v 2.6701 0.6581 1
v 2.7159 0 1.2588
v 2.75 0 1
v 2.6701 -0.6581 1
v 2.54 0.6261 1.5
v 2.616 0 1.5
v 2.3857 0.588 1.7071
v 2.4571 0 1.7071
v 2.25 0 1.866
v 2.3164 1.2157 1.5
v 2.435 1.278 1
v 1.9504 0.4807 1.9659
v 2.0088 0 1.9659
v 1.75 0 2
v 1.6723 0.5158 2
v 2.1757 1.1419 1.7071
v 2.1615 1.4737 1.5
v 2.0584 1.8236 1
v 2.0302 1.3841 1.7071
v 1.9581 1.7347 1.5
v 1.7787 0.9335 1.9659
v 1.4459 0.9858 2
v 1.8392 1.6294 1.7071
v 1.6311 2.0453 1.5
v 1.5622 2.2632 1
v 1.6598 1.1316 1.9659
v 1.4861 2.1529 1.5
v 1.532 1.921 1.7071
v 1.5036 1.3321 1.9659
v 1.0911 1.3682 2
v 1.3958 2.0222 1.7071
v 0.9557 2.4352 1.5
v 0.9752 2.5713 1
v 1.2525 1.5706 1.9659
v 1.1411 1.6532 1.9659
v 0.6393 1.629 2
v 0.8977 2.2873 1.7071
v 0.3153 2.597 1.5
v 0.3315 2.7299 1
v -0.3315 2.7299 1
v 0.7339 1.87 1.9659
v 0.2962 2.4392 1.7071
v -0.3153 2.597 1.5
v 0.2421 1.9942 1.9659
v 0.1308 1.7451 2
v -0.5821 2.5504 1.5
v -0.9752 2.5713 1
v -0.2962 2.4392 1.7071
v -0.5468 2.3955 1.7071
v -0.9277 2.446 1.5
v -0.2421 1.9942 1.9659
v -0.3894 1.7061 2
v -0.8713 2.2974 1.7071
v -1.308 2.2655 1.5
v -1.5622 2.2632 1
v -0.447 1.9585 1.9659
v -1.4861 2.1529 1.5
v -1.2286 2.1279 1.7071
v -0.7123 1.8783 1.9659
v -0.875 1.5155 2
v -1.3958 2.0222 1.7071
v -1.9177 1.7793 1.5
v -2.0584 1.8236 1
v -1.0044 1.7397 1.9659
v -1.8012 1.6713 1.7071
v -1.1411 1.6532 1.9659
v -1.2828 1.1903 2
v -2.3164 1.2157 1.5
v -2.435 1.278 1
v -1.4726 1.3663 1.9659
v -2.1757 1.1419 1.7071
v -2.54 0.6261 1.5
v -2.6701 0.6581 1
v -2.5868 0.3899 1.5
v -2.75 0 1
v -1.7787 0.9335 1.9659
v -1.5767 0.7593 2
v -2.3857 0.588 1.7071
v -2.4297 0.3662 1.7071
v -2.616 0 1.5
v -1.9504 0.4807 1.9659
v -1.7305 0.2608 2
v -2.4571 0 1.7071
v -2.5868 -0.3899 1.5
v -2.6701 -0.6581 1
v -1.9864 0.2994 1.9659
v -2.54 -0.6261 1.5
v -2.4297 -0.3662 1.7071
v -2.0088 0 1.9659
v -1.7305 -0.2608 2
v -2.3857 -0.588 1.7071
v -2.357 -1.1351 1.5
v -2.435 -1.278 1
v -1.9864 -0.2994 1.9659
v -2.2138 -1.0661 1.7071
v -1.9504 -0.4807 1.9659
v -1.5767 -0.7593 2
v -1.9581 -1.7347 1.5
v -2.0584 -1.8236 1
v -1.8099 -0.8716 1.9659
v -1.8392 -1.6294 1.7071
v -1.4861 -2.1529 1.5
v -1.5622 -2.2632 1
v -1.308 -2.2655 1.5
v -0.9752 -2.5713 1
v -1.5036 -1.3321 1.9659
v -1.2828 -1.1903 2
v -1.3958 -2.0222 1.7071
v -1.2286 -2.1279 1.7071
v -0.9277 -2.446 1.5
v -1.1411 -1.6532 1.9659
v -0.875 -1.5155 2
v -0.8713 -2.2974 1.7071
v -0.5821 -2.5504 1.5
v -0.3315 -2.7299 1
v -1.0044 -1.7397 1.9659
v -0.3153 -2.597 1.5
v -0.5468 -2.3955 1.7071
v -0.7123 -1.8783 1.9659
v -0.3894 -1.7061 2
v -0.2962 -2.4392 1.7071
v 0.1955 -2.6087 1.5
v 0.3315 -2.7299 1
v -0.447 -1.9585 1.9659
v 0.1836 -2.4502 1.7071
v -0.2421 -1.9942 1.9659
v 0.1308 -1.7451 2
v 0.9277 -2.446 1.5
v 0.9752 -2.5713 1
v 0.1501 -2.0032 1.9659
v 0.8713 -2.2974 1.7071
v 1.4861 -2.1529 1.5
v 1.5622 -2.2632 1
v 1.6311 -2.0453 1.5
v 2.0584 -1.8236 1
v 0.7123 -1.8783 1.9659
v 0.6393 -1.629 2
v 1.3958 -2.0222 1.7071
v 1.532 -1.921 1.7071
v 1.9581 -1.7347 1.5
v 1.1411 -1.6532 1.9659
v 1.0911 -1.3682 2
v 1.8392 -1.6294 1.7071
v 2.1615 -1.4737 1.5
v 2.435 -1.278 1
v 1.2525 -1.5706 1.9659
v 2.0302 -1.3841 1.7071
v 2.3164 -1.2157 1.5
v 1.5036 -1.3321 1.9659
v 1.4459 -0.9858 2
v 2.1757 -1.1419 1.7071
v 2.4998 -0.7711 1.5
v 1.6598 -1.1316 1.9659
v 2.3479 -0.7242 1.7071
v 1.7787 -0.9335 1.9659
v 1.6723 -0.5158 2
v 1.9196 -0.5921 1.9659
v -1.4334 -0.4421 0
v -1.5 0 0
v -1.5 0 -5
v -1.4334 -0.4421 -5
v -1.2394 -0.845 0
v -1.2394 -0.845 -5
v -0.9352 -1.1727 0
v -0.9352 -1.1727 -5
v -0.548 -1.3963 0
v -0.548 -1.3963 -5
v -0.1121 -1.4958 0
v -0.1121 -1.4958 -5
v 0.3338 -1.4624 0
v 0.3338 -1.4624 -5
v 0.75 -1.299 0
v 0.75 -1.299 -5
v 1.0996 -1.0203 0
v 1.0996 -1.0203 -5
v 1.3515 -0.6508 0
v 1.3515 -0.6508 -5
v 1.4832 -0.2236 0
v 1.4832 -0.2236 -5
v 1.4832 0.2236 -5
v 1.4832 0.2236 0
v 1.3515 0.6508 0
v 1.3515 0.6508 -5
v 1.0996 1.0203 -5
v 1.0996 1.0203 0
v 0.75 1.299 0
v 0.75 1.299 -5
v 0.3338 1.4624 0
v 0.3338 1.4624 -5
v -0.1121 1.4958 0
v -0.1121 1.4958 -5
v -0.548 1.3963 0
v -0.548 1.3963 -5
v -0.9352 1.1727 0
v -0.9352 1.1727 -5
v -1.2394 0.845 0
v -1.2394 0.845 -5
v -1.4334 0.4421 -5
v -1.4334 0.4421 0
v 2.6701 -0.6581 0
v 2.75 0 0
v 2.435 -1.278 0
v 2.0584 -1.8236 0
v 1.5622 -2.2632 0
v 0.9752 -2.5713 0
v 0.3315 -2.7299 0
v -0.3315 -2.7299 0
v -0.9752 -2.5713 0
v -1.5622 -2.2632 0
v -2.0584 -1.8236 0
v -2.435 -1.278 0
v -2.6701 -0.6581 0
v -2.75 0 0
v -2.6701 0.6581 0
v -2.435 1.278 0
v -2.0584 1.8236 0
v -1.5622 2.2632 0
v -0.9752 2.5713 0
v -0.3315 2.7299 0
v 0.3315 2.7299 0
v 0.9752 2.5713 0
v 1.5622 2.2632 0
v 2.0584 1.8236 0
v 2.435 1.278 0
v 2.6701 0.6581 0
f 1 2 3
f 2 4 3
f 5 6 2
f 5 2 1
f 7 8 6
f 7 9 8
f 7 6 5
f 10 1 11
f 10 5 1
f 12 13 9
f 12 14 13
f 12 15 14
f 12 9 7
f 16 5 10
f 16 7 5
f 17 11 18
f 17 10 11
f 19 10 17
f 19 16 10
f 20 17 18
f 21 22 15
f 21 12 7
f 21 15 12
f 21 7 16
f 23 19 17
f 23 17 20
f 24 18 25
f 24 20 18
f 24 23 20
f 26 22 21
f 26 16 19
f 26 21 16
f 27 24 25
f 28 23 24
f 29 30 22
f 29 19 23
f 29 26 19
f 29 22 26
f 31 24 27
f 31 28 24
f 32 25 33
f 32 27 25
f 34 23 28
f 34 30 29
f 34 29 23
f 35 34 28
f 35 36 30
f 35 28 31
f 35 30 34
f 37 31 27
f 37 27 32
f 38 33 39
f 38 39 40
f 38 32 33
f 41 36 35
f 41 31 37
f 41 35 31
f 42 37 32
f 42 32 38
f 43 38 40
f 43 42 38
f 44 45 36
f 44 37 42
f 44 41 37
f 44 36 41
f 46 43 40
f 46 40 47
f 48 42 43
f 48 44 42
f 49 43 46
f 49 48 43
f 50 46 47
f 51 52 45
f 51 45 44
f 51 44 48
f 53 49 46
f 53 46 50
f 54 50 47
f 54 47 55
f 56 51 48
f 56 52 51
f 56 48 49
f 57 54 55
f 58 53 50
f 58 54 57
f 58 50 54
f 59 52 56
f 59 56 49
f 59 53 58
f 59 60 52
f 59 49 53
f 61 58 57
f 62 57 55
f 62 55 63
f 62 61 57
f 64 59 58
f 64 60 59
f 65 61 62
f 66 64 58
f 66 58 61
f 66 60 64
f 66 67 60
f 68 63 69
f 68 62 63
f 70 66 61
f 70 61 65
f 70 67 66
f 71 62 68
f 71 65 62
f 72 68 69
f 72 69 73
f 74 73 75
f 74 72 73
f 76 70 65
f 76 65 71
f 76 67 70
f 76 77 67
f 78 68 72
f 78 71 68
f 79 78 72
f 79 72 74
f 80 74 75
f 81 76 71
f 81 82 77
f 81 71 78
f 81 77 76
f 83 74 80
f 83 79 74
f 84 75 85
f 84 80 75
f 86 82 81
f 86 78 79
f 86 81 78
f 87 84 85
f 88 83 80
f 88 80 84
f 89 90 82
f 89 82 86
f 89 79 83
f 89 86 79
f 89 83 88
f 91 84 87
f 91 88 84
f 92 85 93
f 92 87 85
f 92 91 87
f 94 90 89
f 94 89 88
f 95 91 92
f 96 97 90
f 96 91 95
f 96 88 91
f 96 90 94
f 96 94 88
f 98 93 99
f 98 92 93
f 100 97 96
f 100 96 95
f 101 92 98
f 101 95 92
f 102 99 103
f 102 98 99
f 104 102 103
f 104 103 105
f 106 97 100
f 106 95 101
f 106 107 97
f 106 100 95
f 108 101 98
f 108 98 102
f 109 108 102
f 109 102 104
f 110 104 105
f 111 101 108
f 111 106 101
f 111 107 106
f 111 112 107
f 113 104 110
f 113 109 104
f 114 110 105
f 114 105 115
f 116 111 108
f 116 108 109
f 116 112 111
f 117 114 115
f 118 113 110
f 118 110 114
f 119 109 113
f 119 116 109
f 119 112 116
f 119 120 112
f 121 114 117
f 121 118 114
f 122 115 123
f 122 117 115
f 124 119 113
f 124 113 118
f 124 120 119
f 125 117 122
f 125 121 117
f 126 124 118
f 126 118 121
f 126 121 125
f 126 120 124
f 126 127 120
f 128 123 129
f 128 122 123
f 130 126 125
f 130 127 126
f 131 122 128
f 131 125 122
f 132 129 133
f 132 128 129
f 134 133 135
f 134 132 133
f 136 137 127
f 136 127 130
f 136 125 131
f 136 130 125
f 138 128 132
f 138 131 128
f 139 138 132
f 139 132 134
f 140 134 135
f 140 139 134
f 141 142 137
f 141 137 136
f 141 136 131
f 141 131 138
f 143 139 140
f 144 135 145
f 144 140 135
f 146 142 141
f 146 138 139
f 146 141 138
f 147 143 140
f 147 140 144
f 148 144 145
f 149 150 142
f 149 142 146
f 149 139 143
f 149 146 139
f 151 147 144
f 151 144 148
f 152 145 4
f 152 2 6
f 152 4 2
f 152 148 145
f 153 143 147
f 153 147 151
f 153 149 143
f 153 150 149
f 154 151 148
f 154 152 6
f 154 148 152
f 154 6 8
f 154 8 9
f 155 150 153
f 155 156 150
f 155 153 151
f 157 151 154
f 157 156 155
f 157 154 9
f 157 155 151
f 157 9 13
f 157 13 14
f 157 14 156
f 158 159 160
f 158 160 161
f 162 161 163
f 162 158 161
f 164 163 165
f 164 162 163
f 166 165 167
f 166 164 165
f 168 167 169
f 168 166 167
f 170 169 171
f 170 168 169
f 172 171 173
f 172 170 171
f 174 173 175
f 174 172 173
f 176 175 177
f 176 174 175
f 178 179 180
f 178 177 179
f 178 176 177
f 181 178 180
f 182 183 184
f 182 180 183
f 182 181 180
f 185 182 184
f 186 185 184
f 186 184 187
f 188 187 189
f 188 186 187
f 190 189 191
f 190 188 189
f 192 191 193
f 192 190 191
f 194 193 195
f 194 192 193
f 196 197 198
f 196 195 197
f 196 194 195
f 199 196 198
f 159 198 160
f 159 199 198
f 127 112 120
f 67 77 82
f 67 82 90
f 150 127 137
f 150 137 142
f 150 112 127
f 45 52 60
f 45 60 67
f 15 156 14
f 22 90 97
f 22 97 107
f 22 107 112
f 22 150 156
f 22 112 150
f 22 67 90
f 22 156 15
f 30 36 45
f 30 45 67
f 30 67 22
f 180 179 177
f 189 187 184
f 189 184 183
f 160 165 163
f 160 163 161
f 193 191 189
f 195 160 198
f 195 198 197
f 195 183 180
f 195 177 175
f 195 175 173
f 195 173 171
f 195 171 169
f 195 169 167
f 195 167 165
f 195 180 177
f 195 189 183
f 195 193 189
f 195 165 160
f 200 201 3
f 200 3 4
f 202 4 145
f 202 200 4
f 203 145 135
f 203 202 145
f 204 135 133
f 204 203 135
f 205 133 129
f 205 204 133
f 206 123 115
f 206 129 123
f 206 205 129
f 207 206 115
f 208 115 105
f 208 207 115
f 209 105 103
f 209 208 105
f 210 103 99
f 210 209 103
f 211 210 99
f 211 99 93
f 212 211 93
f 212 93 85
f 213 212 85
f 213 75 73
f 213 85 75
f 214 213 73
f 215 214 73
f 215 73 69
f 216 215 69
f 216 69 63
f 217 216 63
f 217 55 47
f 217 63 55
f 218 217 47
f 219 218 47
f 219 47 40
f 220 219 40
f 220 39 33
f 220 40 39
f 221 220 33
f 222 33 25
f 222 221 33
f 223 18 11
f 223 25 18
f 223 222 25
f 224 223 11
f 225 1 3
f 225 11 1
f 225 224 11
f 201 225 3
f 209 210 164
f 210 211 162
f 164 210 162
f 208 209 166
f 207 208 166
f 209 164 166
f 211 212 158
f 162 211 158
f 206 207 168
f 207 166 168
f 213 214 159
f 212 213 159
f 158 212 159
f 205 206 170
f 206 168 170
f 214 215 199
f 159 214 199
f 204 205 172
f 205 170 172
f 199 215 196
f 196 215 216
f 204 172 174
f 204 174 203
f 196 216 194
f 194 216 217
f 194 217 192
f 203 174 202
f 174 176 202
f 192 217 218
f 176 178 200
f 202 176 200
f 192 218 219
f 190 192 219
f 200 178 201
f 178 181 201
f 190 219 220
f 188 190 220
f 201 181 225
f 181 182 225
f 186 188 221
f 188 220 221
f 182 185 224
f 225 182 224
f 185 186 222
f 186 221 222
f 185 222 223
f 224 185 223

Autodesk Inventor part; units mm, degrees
ref_plane "YZ Plane" through (0, 0, 0) normal (1, 0, 0) x (0, 1, 0)
ref_plane "XZ Plane" through (0, 0, 0) normal (0, 1, 0) x (-1, 0, 0)
ref_plane "XY Plane" through (0, 0, 0) normal (0, 0, 1) x (1, 0, 0)
sketch "スケッチ1" plane through (0, 0, 0) normal (0, 0, 1) x (1, 0, 0)
  circle A0 centre (0, 0) radius 2.75
  dimension "d0" = 5.5
extrude "押し出し1" add sketch "スケッチ1" along normal blind 2
fillet "フィレット1" radius 1 1 edges at (-2.75, 0, 2)
sketch "スケッチ2" plane through (0, 0, 0) normal (0, 0, -1) x (-1, 0, 0)
  circle A0 centre (0, 0) radius 1.5
  dimension "d4" = 3
extrude "押し出し2" add sketch "スケッチ2" along normal blind 5
thread "ねじ1" size "M3x0.5" class "6g" standard "ANSI Metric M Profile" full length
properties part number "Screw_5mm" material "真鍮"
